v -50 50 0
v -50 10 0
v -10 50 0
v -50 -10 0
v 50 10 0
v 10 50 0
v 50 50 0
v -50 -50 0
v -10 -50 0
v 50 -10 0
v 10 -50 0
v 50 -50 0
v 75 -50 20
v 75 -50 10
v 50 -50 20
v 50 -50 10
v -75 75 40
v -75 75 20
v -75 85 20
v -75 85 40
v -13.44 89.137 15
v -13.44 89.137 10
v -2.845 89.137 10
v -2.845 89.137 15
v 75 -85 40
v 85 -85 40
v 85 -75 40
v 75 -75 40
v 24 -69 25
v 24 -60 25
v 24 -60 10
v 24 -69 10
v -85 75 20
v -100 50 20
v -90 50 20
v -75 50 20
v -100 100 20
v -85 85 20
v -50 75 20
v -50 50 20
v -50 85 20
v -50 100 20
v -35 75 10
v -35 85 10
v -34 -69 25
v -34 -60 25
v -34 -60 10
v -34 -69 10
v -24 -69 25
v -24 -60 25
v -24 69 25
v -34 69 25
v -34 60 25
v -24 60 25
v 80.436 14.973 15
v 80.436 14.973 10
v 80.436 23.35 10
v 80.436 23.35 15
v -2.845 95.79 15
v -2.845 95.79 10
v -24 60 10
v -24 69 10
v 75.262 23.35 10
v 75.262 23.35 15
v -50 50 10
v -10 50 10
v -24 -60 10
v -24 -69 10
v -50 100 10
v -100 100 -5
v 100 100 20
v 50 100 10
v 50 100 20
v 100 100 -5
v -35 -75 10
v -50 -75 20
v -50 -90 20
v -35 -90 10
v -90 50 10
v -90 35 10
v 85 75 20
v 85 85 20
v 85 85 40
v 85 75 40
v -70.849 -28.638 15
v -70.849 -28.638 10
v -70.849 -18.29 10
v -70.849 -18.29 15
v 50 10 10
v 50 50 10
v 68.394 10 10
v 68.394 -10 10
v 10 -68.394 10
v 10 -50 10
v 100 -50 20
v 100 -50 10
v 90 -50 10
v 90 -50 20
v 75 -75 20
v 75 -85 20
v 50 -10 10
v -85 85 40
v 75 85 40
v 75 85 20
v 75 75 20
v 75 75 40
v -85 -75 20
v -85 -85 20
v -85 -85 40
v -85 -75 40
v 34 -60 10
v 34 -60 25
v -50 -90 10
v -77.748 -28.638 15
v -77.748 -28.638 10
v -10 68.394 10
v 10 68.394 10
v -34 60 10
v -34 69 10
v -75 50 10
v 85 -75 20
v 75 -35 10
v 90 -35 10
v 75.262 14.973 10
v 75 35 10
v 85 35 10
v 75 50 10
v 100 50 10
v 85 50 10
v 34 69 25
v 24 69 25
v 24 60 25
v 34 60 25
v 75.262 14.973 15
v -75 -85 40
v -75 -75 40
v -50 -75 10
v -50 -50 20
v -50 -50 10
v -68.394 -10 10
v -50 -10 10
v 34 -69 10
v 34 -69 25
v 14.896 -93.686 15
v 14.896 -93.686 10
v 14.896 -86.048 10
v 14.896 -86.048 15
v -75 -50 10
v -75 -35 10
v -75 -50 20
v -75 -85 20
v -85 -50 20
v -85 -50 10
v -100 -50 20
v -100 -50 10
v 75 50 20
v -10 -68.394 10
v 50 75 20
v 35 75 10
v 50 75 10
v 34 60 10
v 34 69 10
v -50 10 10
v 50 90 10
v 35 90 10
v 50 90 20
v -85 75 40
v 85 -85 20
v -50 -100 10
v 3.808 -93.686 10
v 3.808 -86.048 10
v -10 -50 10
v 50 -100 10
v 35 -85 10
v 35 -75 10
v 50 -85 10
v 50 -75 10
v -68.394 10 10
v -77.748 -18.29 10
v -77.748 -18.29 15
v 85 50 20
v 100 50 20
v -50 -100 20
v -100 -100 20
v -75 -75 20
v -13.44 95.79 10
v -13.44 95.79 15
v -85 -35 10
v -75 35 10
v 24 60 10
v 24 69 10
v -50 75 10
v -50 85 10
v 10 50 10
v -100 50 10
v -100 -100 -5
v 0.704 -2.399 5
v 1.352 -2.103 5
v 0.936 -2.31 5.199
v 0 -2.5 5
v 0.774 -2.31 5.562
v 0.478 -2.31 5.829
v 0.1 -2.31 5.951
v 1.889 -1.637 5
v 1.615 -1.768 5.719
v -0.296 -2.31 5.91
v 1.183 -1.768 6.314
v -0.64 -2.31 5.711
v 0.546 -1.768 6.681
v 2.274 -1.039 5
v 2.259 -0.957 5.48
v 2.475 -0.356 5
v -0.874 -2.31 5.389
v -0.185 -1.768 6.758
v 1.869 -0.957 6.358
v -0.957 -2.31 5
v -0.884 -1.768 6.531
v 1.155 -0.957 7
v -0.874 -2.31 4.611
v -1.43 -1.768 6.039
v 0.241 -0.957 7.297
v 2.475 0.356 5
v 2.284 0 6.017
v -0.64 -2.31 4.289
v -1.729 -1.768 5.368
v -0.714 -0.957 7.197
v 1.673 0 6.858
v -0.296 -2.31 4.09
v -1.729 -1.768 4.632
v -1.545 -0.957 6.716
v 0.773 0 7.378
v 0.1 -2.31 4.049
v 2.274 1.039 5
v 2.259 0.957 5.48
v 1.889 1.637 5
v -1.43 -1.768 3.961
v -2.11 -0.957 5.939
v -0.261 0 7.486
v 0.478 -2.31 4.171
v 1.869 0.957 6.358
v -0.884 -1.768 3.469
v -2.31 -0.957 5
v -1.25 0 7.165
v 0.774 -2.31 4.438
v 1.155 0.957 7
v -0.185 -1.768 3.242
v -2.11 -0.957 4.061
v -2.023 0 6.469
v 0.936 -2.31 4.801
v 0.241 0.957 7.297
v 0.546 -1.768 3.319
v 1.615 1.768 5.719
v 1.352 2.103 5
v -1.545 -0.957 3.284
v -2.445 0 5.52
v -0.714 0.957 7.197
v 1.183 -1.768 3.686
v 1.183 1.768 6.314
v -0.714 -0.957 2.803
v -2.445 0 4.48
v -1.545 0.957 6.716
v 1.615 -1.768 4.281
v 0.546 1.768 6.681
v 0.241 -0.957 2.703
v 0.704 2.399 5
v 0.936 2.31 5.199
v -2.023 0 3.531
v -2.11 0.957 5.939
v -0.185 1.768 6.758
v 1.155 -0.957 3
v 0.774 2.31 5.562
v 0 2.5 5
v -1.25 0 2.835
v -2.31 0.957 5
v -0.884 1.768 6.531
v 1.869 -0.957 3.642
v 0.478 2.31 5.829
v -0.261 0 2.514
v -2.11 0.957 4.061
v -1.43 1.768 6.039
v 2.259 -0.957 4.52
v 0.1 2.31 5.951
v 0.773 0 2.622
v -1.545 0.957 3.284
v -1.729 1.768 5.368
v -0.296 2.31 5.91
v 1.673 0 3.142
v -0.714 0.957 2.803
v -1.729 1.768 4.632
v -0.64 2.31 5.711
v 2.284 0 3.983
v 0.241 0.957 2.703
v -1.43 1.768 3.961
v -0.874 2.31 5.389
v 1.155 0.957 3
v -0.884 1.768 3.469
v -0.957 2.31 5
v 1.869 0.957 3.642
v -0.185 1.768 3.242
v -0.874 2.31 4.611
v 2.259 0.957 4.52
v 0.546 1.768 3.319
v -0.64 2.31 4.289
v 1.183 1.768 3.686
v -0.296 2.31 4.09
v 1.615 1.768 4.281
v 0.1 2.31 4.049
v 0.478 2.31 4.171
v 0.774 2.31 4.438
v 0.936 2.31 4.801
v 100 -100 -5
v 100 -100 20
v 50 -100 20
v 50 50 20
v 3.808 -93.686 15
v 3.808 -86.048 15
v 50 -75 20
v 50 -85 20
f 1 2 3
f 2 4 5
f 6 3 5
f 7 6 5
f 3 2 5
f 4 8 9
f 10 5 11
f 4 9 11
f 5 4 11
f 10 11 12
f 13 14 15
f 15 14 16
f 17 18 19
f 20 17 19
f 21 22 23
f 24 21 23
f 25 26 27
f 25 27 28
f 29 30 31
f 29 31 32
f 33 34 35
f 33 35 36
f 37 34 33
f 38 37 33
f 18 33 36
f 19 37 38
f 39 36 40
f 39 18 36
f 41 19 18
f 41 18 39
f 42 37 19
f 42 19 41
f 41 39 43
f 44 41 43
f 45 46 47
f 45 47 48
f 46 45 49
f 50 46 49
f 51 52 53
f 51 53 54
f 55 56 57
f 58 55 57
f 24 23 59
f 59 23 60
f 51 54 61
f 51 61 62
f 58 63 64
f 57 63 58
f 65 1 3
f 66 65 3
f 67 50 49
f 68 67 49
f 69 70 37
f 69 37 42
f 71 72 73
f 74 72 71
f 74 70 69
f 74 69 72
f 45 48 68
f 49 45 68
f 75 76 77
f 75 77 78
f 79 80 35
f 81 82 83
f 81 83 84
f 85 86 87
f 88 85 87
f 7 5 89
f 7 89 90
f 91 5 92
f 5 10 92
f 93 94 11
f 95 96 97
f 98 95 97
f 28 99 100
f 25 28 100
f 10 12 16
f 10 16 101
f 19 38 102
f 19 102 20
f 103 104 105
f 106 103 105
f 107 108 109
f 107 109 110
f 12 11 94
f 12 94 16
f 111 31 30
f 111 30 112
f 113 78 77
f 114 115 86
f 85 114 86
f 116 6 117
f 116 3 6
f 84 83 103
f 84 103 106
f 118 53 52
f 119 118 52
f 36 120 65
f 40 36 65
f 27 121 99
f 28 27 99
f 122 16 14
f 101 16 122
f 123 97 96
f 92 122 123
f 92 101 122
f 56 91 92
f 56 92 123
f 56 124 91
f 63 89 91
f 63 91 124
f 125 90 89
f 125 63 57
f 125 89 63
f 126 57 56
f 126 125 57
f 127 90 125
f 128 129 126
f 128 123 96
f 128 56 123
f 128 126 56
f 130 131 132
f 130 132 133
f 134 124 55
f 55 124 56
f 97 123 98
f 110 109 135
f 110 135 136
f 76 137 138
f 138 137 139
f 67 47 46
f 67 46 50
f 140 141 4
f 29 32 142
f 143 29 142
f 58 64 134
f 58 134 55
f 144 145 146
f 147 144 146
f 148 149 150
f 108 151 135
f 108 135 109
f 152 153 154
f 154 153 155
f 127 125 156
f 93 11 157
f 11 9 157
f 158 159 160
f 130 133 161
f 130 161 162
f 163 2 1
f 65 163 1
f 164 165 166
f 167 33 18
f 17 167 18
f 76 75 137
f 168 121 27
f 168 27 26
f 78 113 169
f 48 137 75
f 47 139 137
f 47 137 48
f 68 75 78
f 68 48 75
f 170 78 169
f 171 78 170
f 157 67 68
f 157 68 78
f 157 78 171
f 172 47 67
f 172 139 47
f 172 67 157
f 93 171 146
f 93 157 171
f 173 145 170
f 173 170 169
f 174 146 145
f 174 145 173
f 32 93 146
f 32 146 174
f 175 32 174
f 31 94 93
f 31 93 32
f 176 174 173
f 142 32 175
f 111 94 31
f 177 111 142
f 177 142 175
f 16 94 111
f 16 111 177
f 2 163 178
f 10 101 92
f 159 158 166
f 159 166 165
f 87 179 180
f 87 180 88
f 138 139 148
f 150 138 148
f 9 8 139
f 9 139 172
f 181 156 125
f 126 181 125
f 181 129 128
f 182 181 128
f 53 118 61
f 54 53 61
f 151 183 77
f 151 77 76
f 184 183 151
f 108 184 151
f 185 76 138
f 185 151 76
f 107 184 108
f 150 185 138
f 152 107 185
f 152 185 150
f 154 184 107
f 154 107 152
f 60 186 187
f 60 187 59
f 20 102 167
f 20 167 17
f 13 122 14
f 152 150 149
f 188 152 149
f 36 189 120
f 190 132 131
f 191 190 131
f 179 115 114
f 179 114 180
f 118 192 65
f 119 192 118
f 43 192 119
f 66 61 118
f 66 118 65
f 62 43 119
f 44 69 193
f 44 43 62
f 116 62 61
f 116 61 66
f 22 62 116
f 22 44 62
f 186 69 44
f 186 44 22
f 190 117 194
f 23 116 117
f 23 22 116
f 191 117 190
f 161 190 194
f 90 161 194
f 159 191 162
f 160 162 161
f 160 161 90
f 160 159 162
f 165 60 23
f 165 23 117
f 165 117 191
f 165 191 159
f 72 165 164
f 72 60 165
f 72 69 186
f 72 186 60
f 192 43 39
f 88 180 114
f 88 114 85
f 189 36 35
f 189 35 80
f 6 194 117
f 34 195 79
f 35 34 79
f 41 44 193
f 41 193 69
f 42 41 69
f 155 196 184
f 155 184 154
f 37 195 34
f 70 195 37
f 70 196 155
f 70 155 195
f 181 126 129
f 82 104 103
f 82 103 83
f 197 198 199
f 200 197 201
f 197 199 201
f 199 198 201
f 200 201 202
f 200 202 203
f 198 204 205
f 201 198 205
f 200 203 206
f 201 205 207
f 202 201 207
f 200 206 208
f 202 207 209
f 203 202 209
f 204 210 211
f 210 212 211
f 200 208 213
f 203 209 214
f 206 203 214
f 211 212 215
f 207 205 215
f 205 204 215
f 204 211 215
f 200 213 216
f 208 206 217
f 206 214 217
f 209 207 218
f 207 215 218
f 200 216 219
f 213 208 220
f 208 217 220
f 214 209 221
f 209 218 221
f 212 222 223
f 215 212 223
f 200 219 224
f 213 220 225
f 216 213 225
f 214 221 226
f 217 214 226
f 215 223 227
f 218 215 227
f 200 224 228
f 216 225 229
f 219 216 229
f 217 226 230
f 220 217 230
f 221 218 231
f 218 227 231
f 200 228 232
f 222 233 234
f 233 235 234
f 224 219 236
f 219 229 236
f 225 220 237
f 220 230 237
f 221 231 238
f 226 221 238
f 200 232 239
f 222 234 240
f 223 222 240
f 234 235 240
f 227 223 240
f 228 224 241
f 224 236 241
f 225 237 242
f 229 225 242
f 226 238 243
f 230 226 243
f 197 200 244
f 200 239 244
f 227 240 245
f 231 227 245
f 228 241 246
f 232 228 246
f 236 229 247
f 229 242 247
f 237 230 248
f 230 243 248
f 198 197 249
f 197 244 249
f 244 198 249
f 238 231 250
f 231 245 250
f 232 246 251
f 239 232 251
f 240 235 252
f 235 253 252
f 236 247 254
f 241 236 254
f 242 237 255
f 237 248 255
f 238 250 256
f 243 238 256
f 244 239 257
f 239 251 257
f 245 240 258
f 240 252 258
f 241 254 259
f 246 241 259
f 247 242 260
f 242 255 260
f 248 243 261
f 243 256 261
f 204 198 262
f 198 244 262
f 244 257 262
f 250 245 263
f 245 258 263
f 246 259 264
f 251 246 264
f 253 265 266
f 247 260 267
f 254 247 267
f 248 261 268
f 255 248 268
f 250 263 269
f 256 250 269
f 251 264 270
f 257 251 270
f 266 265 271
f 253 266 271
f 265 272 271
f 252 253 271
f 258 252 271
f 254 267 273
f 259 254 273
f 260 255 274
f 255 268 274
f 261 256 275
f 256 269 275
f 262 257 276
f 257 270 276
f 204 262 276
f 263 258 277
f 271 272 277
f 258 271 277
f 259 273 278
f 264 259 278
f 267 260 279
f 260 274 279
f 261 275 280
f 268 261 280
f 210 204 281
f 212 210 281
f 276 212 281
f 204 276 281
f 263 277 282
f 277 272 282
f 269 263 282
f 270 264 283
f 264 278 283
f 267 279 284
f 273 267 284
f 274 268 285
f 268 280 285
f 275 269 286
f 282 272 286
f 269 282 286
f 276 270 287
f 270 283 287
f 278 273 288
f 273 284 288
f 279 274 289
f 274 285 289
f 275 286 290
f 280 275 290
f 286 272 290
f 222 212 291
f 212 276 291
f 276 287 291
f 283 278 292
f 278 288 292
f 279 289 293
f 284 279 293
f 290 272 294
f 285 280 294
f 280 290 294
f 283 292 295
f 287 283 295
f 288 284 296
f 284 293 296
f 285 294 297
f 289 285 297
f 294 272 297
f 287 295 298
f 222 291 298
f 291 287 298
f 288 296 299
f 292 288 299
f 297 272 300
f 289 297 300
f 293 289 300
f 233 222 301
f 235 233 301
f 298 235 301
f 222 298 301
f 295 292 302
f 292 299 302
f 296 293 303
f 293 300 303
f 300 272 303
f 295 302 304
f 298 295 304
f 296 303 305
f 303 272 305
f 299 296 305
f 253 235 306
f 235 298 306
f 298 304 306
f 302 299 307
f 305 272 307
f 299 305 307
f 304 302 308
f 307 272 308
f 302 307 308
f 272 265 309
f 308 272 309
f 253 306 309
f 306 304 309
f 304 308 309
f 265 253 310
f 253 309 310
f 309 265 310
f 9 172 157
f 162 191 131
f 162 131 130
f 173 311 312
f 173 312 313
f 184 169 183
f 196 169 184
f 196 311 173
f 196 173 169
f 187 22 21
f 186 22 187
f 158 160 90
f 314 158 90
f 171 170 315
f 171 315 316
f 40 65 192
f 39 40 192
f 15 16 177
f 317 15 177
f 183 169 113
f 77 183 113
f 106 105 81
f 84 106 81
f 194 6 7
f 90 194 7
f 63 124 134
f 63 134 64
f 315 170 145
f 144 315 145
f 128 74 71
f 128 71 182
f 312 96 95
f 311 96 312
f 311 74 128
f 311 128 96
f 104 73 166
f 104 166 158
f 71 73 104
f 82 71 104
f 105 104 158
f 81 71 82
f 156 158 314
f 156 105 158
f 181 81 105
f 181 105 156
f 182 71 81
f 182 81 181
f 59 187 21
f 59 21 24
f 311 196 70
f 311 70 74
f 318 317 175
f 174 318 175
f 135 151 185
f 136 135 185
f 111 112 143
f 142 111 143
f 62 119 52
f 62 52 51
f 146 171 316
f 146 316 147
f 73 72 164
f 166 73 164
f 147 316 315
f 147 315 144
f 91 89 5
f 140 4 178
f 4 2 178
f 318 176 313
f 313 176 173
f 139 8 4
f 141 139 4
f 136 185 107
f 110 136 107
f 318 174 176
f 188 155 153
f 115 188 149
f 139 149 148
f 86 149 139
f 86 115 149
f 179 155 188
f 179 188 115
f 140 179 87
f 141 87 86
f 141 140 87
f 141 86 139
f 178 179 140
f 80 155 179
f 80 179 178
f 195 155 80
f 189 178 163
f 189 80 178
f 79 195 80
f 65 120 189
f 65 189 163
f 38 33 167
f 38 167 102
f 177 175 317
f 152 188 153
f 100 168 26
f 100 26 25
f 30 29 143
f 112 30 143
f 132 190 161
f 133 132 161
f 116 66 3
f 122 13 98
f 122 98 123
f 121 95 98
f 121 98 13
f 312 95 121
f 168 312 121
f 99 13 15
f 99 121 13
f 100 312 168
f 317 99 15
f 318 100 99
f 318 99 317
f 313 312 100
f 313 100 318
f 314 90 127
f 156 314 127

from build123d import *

# Parameters (mm, degrees)
F0_W             = 200
F0_H             = 200
F0_W_2           = 100
F0_H_2           = 100
F1_DEPTH         = 10
F2_W             = 200
F2_H             = 200
F3_DEPTH         = 5
F5_DEPTH         = 10
F5_DEPTH_BACK    = 10
F5_COPIES_COUNT  = 4
F7_W             = 50
F7_H             = 50
F8_DEPTH         = 10
F8_COPIES_COUNT  = 4
F12_DEPTH        = 10
F12_COPIES_COUNT = 4
F15_DEPTH        = 15
F15_COPIES_COUNT = 4
F9_W             = 10
F9_H             = 10
F17_DEPTH        = 20
F17_COPIES_COUNT = 4
F18_W            = 10
F18_H            = 9
F19_DEPTH        = 15
F21_W            = 5.1742345095
F21_H            = 8.3773322403
F21_W_2          = 10.5948613491
F21_H_2          = 6.6525861621
F21_W_3          = 6.898984313
F21_H_3          = 10.3484708816
F21_W_4          = 11.0876462422
F21_H_4          = 7.638156414
F22_DEPTH        = 5


# Not quite as in the source:
# - a pattern or mirror of a feature is missing from the dataset's text; its kind, count and spacing are read off the source's solid


with BuildPart() as f1:
    # F0 (on Top) → F1 (new body)
    with BuildSketch(Plane.XY):
        Rectangle(F0_W, F0_H)
        Rectangle(F0_W_2, F0_H_2, mode=Mode.SUBTRACT)
    extrude(amount=F1_DEPTH)

    # F2 (on face) → F3 (join)
    with BuildSketch(Plane(origin=(0, 0, 0), x_dir=(1, 0, 0), z_dir=(0, 0, -1))):
        Rectangle(F2_W, F2_H)
    extrude(amount=F3_DEPTH)

    # F4 (on Right) → F5 (cut, two sides)
    with BuildSketch(Plane.YZ) as f5_sk:
        Polygon((68.3940351009, 10), (50, 10), (50, 0), align=None)
    f5 = extrude(amount=-F5_DEPTH, mode=Mode.SUBTRACT) + extrude(f5_sk.sketch, amount=F5_DEPTH_BACK, mode=Mode.SUBTRACT)

    # F5_copies: F5 ×4 about axis
    f5_copies_axis = Axis((0, 0, 0), (0, 0, 1))
    for i in range(1, F5_COPIES_COUNT):
        add(f5.rotate(f5_copies_axis, i * 360 / F5_COPIES_COUNT), mode=Mode.SUBTRACT)

    # F7 (on face) → F8 (join)
    with BuildSketch(Plane.XY.offset(10)):
        with Locations((-75, 75)):
            Rectangle(F7_W, F7_H)
    f8 = extrude(amount=F8_DEPTH)

    # F8_copies: F8 ×4 about axis
    f8_copies_axis = Axis((0, 0, 0), (0, 0, 1))
    for i in range(1, F8_COPIES_COUNT):
        add(f8.rotate(f8_copies_axis, i * 360 / F8_COPIES_COUNT))

    # F11 (on line) → F12 (join)
    with BuildSketch(Plane(origin=(0, 75, 0), x_dir=(-1, 0, 0), z_dir=(0, 1, 0))):
        Polygon((50, 10), (50, 20), (35, 10), align=None)
    f12 = extrude(amount=F12_DEPTH)

    # F12_copies: F12 ×4 about axis
    f12_copies_axis = Axis((0, 0, 0), (0, 0, 1))
    for i in range(1, F12_COPIES_COUNT):
        add(f12.rotate(f12_copies_axis, i * 360 / F12_COPIES_COUNT))

    # F14 (on line) → F15 (join)
    with BuildSketch(Plane.YZ.offset(-75)):
        Polygon((50, 10), (50, 20), (35, 10), align=None)
    f15 = extrude(amount=-F15_DEPTH)

    # F15_copies: F15 ×4 about axis
    f15_copies_axis = Axis((0, 0, 0), (0, 0, 1))
    for i in range(1, F15_COPIES_COUNT):
        add(f15.rotate(f15_copies_axis, i * 360 / F15_COPIES_COUNT))

    # F9 (on face) → F17 (join)
    with BuildSketch(Plane.XY.offset(20)):
        with Locations((-80, 80)):
            Rectangle(F9_W, F9_H)
    f17 = extrude(amount=F17_DEPTH)

    # F17_copies: F17 ×4 about axis
    f17_copies_axis = Axis((0, 0, 0), (0, 0, 1))
    for i in range(1, F17_COPIES_COUNT):
        add(f17.rotate(f17_copies_axis, i * 360 / F17_COPIES_COUNT))

    # F18 (on face) → F19 (join)
    with BuildSketch(Plane.XY.offset(10)):
        with Locations((-29, 64.5)):
            Rectangle(F18_W, F18_H)
        with Locations((29, 64.5)):
            Rectangle(F18_W, F18_H)
    f19 = extrude(amount=F19_DEPTH)

    # F19_copies: F19 across plane
    add(f19.mirror(Plane(origin=(0, 0, 0), x_dir=(0, 0, -1), z_dir=(0, -1, 0))))

    # F21 (on face) → F22 (join)
    with BuildSketch(Plane.XY.offset(10)):
        with Locations((77.8486952186, 19.161650911)):
            Rectangle(F21_W, F21_H)
        with Locations((-8.1421594368, 92.4633108079)):
            Rectangle(F21_W_2, F21_H_2)
        with Locations((-74.2984488606, -23.4641870484)):
            Rectangle(F21_W_3, F21_H_3)
        with Locations((9.3516821507, -89.8668691516)):
            Rectangle(F21_W_4, F21_H_4)
    extrude(amount=F22_DEPTH)


with BuildPart() as f25:
    # F24 (on offset) → F25 (revolve)
    with BuildSketch(Plane.XY.offset(5)):
        with BuildLine():
            Line((0, 2.5), (0, -2.5))
            ThreePointArc((0, -2.5), (2.5, 0), (0, 2.5))
        make_face()
    revolve(axis=Axis((0, 0.5305833183, 5), (0, -1, 0)))


solid = Compound([f1.part, f25.part])
